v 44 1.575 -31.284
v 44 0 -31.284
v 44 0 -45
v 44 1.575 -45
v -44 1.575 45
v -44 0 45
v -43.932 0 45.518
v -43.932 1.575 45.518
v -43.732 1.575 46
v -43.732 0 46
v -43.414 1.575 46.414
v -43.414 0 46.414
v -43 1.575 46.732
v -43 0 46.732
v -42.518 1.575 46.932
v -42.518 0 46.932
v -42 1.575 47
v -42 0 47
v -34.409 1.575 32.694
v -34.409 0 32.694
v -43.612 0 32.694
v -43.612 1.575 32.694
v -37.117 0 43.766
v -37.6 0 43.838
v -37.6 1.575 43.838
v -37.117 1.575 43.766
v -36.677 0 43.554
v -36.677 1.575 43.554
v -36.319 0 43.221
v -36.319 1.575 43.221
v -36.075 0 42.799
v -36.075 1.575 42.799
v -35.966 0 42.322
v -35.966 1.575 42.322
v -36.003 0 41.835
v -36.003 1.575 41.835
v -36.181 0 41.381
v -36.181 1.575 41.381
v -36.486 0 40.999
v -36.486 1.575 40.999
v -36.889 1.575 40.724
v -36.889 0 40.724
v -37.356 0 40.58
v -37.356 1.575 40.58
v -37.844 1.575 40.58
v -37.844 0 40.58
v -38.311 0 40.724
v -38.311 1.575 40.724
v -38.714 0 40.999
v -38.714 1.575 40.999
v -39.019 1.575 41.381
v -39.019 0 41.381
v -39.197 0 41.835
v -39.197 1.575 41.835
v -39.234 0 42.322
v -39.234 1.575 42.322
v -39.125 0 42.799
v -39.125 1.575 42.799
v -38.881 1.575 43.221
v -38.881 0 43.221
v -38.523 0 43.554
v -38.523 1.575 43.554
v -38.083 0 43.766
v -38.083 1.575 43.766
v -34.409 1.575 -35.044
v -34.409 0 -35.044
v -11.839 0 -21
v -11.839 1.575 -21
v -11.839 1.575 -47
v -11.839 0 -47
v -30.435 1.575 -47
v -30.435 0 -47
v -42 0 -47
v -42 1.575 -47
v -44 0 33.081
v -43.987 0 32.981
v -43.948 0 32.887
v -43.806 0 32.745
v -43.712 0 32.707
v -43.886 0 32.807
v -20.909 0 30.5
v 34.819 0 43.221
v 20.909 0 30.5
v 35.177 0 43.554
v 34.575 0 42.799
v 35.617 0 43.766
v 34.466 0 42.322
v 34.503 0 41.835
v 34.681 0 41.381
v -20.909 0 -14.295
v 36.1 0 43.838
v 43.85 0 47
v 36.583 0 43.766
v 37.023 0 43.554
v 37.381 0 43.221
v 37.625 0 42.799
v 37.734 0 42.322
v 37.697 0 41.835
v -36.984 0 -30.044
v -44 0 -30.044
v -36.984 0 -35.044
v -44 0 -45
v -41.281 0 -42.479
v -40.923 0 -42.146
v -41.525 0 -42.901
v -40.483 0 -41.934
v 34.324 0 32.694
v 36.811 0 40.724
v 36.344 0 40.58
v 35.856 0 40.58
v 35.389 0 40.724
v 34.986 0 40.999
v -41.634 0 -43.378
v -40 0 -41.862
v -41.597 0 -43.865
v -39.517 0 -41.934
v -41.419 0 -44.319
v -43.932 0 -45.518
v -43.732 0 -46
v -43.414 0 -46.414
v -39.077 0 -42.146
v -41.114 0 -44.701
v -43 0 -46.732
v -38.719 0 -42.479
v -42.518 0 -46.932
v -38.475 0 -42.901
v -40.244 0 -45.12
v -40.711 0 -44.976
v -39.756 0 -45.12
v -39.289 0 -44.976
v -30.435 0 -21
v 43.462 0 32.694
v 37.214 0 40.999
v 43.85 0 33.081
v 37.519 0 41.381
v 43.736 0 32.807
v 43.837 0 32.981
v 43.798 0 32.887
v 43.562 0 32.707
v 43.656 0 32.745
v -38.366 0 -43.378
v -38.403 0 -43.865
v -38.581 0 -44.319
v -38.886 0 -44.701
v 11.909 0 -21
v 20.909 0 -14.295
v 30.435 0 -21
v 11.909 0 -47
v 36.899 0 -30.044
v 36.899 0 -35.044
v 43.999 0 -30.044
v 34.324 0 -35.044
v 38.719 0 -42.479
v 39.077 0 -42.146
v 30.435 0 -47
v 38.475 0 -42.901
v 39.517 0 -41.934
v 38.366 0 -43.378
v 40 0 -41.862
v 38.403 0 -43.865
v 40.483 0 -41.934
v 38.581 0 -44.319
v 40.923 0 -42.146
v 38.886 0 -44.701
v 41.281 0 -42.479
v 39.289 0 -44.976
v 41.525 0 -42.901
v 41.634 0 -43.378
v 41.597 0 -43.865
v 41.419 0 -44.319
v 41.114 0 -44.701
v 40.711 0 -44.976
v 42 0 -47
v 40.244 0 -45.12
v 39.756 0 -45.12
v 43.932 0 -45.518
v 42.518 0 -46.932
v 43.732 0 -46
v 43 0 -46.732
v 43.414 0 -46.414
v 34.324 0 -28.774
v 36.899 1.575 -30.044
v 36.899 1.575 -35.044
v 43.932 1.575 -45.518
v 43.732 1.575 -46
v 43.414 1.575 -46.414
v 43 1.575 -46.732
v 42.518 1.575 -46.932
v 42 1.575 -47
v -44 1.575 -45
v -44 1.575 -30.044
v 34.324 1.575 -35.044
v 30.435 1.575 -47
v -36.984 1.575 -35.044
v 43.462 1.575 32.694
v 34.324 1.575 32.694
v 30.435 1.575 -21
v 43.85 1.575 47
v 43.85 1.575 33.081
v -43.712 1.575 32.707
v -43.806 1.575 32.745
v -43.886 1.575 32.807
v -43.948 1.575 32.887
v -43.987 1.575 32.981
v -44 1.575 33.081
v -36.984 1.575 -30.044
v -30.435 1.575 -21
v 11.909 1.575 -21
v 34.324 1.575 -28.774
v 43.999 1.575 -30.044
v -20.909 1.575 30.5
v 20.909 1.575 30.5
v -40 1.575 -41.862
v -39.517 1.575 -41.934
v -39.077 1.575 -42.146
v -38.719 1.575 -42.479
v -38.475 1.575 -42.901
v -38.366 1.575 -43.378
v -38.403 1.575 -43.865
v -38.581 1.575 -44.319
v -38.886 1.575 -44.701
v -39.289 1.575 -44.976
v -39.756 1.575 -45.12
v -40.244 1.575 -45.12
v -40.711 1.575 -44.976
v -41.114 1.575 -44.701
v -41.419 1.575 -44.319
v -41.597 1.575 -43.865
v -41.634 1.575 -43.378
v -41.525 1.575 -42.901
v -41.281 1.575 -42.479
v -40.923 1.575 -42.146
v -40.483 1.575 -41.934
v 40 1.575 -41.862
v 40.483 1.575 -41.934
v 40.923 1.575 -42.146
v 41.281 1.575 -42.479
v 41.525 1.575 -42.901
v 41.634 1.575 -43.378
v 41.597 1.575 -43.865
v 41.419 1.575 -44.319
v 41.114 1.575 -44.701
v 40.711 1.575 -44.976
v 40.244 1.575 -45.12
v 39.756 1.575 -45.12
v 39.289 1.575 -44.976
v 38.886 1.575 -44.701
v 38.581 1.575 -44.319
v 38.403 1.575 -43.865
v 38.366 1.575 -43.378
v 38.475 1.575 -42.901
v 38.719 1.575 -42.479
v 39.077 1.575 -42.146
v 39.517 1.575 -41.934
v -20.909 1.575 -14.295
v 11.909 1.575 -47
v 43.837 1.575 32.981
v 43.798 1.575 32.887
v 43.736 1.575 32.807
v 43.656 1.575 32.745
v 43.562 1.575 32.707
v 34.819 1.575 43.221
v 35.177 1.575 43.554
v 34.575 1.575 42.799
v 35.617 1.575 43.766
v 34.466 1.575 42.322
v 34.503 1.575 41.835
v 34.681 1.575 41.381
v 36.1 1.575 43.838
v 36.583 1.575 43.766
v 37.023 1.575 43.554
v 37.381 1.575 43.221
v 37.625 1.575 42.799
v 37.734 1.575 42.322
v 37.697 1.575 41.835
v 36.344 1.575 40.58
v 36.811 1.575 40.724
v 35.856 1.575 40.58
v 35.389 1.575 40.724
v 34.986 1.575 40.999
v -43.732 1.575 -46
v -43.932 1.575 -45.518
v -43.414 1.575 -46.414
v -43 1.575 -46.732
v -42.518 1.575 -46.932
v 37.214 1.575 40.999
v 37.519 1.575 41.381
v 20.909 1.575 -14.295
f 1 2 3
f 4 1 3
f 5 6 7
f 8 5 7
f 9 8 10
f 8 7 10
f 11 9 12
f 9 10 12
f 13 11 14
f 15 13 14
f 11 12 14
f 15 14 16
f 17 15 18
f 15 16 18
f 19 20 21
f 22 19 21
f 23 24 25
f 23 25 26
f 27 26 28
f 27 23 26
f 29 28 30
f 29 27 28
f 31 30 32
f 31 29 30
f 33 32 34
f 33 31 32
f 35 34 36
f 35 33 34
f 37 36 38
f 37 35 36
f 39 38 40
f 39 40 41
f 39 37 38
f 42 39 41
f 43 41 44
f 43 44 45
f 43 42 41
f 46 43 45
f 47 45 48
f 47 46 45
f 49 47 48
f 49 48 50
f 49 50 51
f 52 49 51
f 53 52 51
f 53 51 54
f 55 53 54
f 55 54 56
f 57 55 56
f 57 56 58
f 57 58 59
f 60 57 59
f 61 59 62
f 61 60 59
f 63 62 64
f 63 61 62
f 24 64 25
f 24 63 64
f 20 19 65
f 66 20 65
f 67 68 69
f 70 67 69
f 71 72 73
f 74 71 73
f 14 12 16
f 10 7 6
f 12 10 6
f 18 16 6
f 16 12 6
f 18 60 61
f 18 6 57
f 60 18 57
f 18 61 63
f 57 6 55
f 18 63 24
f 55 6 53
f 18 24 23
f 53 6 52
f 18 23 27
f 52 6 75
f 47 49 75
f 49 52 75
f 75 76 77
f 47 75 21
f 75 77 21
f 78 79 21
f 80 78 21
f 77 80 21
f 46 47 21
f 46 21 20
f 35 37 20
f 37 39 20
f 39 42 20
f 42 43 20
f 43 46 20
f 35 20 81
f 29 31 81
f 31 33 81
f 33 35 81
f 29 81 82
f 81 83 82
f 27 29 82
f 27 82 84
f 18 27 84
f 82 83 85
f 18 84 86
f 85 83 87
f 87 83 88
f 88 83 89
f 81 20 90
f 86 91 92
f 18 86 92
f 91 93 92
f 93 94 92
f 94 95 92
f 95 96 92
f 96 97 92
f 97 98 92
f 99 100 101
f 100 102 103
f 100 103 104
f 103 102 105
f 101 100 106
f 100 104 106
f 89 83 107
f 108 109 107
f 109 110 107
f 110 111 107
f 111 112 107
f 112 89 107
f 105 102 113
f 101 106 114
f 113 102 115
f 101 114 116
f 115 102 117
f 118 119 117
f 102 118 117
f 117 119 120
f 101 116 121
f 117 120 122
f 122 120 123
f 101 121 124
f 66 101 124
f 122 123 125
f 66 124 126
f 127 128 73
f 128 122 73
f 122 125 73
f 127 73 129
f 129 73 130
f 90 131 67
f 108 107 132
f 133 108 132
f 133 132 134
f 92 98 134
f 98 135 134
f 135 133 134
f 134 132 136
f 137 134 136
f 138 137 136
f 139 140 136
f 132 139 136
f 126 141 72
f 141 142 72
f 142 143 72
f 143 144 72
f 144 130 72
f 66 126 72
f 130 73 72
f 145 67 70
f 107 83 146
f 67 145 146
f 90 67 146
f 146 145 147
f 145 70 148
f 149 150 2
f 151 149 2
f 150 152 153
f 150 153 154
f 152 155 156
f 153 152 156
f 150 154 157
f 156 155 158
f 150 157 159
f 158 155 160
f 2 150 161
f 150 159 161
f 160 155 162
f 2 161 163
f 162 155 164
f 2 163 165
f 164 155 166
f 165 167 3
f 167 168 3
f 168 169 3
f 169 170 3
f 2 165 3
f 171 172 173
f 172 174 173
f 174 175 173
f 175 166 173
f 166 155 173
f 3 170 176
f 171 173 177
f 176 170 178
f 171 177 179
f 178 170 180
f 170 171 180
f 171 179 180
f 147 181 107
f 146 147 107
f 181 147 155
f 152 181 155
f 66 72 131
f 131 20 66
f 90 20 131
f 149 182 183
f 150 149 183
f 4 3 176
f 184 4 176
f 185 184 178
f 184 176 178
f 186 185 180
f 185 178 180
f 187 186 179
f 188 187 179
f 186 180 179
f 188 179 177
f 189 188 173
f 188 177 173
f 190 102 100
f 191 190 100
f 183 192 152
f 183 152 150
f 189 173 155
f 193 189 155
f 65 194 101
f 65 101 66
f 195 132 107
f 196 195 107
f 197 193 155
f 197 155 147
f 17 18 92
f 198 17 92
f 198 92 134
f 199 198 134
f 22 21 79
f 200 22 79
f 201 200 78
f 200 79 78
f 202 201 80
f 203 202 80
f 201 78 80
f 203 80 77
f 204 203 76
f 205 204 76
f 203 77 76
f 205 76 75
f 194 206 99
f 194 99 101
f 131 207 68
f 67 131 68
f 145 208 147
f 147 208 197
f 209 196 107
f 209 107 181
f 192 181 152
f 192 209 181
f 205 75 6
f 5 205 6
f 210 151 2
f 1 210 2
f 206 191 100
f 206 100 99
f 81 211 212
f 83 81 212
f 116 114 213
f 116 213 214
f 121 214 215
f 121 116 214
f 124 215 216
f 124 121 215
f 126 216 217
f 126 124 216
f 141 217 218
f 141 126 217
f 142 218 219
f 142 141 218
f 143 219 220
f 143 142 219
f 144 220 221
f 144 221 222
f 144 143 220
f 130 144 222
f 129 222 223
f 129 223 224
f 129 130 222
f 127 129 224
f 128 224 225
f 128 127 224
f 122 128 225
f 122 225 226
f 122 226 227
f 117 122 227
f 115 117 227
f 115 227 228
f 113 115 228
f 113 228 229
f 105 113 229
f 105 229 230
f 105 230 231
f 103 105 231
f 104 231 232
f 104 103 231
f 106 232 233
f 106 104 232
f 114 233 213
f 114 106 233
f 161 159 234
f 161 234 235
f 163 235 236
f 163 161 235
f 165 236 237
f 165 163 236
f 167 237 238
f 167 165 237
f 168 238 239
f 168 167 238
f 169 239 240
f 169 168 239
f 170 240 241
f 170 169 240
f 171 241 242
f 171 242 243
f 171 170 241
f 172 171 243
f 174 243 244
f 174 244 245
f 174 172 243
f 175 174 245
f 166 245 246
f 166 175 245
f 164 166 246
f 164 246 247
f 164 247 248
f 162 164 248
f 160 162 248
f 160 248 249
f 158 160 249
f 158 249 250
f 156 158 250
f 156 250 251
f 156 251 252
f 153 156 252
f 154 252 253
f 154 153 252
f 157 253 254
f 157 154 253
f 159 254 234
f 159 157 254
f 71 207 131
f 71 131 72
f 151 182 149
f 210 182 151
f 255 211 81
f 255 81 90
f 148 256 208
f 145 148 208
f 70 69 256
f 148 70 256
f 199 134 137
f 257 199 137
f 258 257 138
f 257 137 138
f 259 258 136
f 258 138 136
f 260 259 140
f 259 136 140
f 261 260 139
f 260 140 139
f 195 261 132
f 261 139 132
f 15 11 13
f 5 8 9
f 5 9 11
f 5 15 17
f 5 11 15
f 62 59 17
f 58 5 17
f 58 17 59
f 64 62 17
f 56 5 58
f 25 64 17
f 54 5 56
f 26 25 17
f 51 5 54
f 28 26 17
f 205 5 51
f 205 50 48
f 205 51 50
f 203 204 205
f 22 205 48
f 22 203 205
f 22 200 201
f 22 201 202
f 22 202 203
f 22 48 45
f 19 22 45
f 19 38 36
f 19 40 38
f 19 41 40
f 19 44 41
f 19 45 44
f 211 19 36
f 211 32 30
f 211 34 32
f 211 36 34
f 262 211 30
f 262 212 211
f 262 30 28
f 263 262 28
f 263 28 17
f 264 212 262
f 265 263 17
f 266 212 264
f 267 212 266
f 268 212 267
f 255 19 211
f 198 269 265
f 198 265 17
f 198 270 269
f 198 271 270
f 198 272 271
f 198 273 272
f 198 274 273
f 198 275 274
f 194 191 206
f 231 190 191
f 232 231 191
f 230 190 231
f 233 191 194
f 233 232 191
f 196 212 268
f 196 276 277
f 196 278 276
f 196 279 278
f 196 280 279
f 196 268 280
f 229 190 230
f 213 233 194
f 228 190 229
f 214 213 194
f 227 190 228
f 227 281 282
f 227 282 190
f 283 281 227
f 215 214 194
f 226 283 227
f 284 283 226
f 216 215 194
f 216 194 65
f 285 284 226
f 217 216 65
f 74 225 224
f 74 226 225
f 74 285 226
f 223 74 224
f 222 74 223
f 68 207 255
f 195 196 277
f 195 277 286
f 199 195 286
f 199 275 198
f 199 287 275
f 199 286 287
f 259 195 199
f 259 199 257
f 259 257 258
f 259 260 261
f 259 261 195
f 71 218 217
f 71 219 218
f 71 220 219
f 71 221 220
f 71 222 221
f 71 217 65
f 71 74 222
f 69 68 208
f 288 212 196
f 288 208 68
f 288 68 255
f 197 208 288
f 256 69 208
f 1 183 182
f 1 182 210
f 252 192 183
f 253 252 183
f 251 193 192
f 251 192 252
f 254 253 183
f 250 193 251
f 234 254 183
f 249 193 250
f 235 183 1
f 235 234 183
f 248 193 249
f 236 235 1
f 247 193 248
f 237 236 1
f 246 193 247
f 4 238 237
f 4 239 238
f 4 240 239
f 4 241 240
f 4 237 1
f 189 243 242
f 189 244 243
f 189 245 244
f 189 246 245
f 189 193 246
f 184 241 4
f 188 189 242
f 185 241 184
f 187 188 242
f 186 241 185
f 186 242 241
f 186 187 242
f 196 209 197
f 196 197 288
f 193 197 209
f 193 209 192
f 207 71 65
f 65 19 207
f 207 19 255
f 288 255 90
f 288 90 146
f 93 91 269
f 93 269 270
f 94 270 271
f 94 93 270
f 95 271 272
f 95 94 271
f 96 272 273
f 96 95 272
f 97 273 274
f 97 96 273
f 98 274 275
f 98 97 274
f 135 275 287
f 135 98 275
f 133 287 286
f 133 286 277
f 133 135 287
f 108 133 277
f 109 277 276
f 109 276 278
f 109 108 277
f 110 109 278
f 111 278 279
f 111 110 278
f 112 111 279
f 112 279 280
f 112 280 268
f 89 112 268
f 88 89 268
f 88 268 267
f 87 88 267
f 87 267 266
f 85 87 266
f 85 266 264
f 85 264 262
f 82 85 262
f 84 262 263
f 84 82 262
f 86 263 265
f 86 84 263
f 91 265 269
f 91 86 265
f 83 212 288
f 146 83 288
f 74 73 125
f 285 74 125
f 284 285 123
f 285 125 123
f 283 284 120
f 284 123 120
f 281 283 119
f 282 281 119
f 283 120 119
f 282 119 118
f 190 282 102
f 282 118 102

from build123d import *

# Parameters (mm, degrees)
SKETCH1_R                        = 1.6383
BOSS_EXTRUDE1_DEPTH              = 1.575
CUT_EXTRUDE1_DEPTH               = 2.54
CUTOUTS_FOR_THRUSTER_HEADS_DEPTH = 1.575
NOTCH_FOR_BPR_TOP_VIEW_W         = 2.575
NOTCH_FOR_BPR_TOP_VIEW_H         = 6.27
CUT_EXTRUDE11_DEPTH              = 10
NOTCH_FOR_BPL_TOP_VIEW_W         = 2.575
NOTCH_FOR_BPL_TOP_VIEW_H         = 6.27
CUT_EXTRUDE12_DEPTH              = 65.400936523
SKETCH22_W                       = 1.501374709
SKETCH22_H                       = 61.468
SKETCH22_W_2                     = 1.585
BOSS_EXTRUDE2_DEPTH              = 1.575
SKETCH23_W                       = 7.1002401
SKETCH23_H                       = 1.27
SKETCH23_W_2                     = 7.016
CUT_EXTRUDE13_DEPTH              = 65.400936523
SKETCH25_W                       = 2.5
SKETCH25_H                       = 44.79544
BOSS_EXTRUDE3_DEPTH              = 1.575
SKETCH26_W                       = 2.5
SKETCH26_H                       = 44.79544
BOSS_EXTRUDE4_DEPTH              = 1.575
SKETCH27_W                       = 41.818
SKETCH27_H                       = 1
CUT_EXTRUDE15_DEPTH              = 65.400936523
SKETCH28_W                       = 41.818
SKETCH28_H                       = 1
BOSS_EXTRUDE5_DEPTH              = 1.575


with BuildPart() as part:
    # Sketch1 → Boss-Extrude1 (new body)
    with BuildSketch(Plane(origin=(0, 0, 0), x_dir=(1, 0, 0), z_dir=(0, 1, 0))):
        with BuildLine():
            Line((-44, 45), (-44, 29.162404323))
            ThreePointArc((-44, 29.162404323), (-43.886381258, 28.888104416), (-43.612081351, 28.774485674))
            Line((-43.612081351, 28.774485674), (-33.211918649, 28.774485674))
            ThreePointArc((-33.211918649, 28.774485674), (-32.937618742, 28.660866933), (-32.824, 28.386567026))
            Line((-32.824, 28.386567026), (-32.824, -32.305595677))
            ThreePointArc((-32.824, -32.305595677), (-32.937618742, -32.579895584), (-33.211918649, -32.693514326))
            Line((-33.211918649, -32.693514326), (-36.100000052, -32.693514326))
            Line((-36.100000052, -32.693514326), (-43.612081299, -32.693514326))
            ThreePointArc((-43.612081299, -32.693514326), (-43.886381206, -32.807133067), (-43.999999948, -33.081432974))
            Line((-43.999999948, -33.081432974), (-43.999999948, -38.977))
            Line((-43.999999948, -38.977), (-43.999999948, -45))
            ThreePointArc((-43.999999948, -45), (-43.41421351, -46.414213562), (-41.999999948, -47))
            Line((-41.999999948, -47), (42.705916546, -47))
            Line((42.705916546, -47), (43.849731117, -47))
            Line((43.849731117, -47), (43.849731117, -38.27))
            Line((43.849731117, -38.27), (43.849731117, -33.081432974))
            ThreePointArc((43.849731117, -33.081432974), (43.736112376, -32.807133067), (43.461812469, -32.693514326))
            Line((43.461812469, -32.693514326), (36.098785193, -32.693514326))
            Line((36.098785193, -32.693514326), (33.824, -32.693514326))
            Line((33.824, -32.693514326), (32.822785141, -32.693514326))
            Line((32.822785141, -32.693514326), (32.822785141, -30.469351623))
            Line((32.822785141, -30.469351623), (32.822785141, 27.774485674))
            ThreePointArc((32.822785141, 27.774485674), (33.11567836, 28.481592456), (33.822785141, 28.774485674))
            Line((33.822785141, 28.774485674), (43.611054239, 28.774485674))
            ThreePointArc((43.611054239, 28.774485674), (43.885287743, 28.88803803), (43.998972842, 29.162216531))
            Line((43.998972842, 29.162216531), (44, 31.284))
            Line((44, 31.284), (44, 45))
            ThreePointArc((44, 45), (43.414213562, 46.414213562), (42, 47))
            Line((42, 47), (-42, 47))
            ThreePointArc((-42, 47), (-43.414213562, 46.414213562), (-44, 45))
        make_face()
        with Locations(Location((40, 43.5, 0), (0, 0, 270))):
            Circle(SKETCH1_R, mode=Mode.SUBTRACT)
        with Locations(Location((-40, 43.5, 0), (0, 0, 270))):
            Circle(SKETCH1_R, mode=Mode.SUBTRACT)
        with Locations(Location((-37.599999948, -42.2, 0), (0, 0, 270))):
            Circle(SKETCH1_R, mode=Mode.SUBTRACT)
        with Locations(Location((36.100000052, -42.2, 0), (0, 0, 270))):
            Circle(SKETCH1_R, mode=Mode.SUBTRACT)
        Polygon((23.409, -31.5), (-23.409, -31.5), (-23.409, 13.29544), (-12.909, 13.29544), (-12.909, 25.99544), (12.909, 25.99544), (12.909, 13.29544), (23.409, 13.29544), align=None, mode=Mode.SUBTRACT)
    extrude(amount=BOSS_EXTRUDE1_DEPTH)

    # Sketch2 → Cut-Extrude1 (cut)
    with BuildSketch(Plane(origin=(0, 1.575, 0), x_dir=(1, 0, 0), z_dir=(0, 1, 0))):
        Polygon((-12.909, 19.06), (-30.435, 19.06), (-30.435, 47), (30.435, 47), (30.435, 19.06), (12.909, 19.06), (12.909, 25.99544), (-12.909, 25.99544), align=None)
    extrude(amount=-CUT_EXTRUDE1_DEPTH, mode=Mode.SUBTRACT)

    # Sketch16 → Cutouts for Thruster Heads (add)
    with BuildSketch(Plane(origin=(0, 1.575, 0), x_dir=(1, 0, 0), z_dir=(0, 1, 0))):
        Polygon((12.909, 19.06), (12.909, 13.29544), (-12.909, 13.29544), (-12.909, 19.06), (-30.435, 19.06), (-30.435, 21), (-11.838888217, 21), (-11.838888217, 47), (11.909, 47), (11.909, 21), (30.435, 21), (30.435, 19.06), align=None)
    extrude(amount=-CUTOUTS_FOR_THRUSTER_HEADS_DEPTH)

    # Notch for BPR (TOP VIEW) → Cut-Extrude11 (cut)
    with BuildSketch(Plane(origin=(0, 1.575, 0), x_dir=(1, 0, 0), z_dir=(0, 1, 0))):
        with Locations((-35.6965, 31.909485674)):
            Rectangle(NOTCH_FOR_BPR_TOP_VIEW_W, NOTCH_FOR_BPR_TOP_VIEW_H)
    extrude(amount=-CUT_EXTRUDE11_DEPTH, mode=Mode.SUBTRACT)

    # Notch for BPL (TOP VIEW) → Cut-Extrude12 (cut, through all)
    with BuildSketch(Plane(origin=(0, 1.575, 0), x_dir=(1, 0, 0), z_dir=(0, 1, 0))):
        with Locations((35.61165985, 31.909485674)):
            Rectangle(NOTCH_FOR_BPL_TOP_VIEW_W, NOTCH_FOR_BPL_TOP_VIEW_H)
    extrude(amount=-CUT_EXTRUDE12_DEPTH, mode=Mode.SUBTRACT)

    # Sketch22 → Boss-Extrude2 (add)
    with BuildSketch(Plane(origin=(0, 1.575, 0), x_dir=(1, 0, 0), z_dir=(0, 1, 0))):
        with Locations((33.573472495, -1.959514326)):
            Rectangle(SKETCH22_W, SKETCH22_H)
        with Locations((-33.6165, -1.959514326)):
            Rectangle(SKETCH22_W_2, SKETCH22_H)
    extrude(amount=-BOSS_EXTRUDE2_DEPTH)

    # Sketch23 → Cut-Extrude13 (cut, through all)
    with BuildSketch(Plane(origin=(0, 1.575, 0), x_dir=(1, 0, 0), z_dir=(0, 1, 0))):
        with Locations((40.4492799, 29.409485674)):
            Rectangle(SKETCH23_W, SKETCH23_H)
        with Locations((-40.492, 29.409485674)):
            Rectangle(SKETCH23_W_2, SKETCH23_H)
    extrude(amount=-CUT_EXTRUDE13_DEPTH, mode=Mode.SUBTRACT)

    # Sketch25 → Boss-Extrude3 (add)
    with BuildSketch(Plane(origin=(0, 1.575, 0), x_dir=(1, 0, 0), z_dir=(0, 1, 0))):
        with Locations((22.159, -9.10228)):
            Rectangle(SKETCH25_W, SKETCH25_H)
    extrude(amount=-BOSS_EXTRUDE3_DEPTH)

    # Sketch26 → Boss-Extrude4 (add)
    with BuildSketch(Plane(origin=(0, 1.575, 0), x_dir=(1, 0, 0), z_dir=(0, 1, 0))):
        with Locations((-22.159, -9.10228)):
            Rectangle(SKETCH26_W, SKETCH26_H)
    extrude(amount=-BOSS_EXTRUDE4_DEPTH)

    # Sketch27 → Cut-Extrude15 (cut, through all)
    with BuildSketch(Plane(origin=(0, 1.575, 0), x_dir=(1, 0, 0), z_dir=(0, 1, 0))):
        with Locations((0, 13.79544)):
            Rectangle(SKETCH27_W, SKETCH27_H)
    extrude(amount=-CUT_EXTRUDE15_DEPTH, mode=Mode.SUBTRACT)

    # Sketch28 → Boss-Extrude5 (add)
    with BuildSketch(Plane(origin=(0, 1.575, 0), x_dir=(1, 0, 0), z_dir=(0, 1, 0))):
        with Locations((0, -31)):
            Rectangle(SKETCH28_W, SKETCH28_H)
    extrude(amount=-BOSS_EXTRUDE5_DEPTH)


solid = part.part
